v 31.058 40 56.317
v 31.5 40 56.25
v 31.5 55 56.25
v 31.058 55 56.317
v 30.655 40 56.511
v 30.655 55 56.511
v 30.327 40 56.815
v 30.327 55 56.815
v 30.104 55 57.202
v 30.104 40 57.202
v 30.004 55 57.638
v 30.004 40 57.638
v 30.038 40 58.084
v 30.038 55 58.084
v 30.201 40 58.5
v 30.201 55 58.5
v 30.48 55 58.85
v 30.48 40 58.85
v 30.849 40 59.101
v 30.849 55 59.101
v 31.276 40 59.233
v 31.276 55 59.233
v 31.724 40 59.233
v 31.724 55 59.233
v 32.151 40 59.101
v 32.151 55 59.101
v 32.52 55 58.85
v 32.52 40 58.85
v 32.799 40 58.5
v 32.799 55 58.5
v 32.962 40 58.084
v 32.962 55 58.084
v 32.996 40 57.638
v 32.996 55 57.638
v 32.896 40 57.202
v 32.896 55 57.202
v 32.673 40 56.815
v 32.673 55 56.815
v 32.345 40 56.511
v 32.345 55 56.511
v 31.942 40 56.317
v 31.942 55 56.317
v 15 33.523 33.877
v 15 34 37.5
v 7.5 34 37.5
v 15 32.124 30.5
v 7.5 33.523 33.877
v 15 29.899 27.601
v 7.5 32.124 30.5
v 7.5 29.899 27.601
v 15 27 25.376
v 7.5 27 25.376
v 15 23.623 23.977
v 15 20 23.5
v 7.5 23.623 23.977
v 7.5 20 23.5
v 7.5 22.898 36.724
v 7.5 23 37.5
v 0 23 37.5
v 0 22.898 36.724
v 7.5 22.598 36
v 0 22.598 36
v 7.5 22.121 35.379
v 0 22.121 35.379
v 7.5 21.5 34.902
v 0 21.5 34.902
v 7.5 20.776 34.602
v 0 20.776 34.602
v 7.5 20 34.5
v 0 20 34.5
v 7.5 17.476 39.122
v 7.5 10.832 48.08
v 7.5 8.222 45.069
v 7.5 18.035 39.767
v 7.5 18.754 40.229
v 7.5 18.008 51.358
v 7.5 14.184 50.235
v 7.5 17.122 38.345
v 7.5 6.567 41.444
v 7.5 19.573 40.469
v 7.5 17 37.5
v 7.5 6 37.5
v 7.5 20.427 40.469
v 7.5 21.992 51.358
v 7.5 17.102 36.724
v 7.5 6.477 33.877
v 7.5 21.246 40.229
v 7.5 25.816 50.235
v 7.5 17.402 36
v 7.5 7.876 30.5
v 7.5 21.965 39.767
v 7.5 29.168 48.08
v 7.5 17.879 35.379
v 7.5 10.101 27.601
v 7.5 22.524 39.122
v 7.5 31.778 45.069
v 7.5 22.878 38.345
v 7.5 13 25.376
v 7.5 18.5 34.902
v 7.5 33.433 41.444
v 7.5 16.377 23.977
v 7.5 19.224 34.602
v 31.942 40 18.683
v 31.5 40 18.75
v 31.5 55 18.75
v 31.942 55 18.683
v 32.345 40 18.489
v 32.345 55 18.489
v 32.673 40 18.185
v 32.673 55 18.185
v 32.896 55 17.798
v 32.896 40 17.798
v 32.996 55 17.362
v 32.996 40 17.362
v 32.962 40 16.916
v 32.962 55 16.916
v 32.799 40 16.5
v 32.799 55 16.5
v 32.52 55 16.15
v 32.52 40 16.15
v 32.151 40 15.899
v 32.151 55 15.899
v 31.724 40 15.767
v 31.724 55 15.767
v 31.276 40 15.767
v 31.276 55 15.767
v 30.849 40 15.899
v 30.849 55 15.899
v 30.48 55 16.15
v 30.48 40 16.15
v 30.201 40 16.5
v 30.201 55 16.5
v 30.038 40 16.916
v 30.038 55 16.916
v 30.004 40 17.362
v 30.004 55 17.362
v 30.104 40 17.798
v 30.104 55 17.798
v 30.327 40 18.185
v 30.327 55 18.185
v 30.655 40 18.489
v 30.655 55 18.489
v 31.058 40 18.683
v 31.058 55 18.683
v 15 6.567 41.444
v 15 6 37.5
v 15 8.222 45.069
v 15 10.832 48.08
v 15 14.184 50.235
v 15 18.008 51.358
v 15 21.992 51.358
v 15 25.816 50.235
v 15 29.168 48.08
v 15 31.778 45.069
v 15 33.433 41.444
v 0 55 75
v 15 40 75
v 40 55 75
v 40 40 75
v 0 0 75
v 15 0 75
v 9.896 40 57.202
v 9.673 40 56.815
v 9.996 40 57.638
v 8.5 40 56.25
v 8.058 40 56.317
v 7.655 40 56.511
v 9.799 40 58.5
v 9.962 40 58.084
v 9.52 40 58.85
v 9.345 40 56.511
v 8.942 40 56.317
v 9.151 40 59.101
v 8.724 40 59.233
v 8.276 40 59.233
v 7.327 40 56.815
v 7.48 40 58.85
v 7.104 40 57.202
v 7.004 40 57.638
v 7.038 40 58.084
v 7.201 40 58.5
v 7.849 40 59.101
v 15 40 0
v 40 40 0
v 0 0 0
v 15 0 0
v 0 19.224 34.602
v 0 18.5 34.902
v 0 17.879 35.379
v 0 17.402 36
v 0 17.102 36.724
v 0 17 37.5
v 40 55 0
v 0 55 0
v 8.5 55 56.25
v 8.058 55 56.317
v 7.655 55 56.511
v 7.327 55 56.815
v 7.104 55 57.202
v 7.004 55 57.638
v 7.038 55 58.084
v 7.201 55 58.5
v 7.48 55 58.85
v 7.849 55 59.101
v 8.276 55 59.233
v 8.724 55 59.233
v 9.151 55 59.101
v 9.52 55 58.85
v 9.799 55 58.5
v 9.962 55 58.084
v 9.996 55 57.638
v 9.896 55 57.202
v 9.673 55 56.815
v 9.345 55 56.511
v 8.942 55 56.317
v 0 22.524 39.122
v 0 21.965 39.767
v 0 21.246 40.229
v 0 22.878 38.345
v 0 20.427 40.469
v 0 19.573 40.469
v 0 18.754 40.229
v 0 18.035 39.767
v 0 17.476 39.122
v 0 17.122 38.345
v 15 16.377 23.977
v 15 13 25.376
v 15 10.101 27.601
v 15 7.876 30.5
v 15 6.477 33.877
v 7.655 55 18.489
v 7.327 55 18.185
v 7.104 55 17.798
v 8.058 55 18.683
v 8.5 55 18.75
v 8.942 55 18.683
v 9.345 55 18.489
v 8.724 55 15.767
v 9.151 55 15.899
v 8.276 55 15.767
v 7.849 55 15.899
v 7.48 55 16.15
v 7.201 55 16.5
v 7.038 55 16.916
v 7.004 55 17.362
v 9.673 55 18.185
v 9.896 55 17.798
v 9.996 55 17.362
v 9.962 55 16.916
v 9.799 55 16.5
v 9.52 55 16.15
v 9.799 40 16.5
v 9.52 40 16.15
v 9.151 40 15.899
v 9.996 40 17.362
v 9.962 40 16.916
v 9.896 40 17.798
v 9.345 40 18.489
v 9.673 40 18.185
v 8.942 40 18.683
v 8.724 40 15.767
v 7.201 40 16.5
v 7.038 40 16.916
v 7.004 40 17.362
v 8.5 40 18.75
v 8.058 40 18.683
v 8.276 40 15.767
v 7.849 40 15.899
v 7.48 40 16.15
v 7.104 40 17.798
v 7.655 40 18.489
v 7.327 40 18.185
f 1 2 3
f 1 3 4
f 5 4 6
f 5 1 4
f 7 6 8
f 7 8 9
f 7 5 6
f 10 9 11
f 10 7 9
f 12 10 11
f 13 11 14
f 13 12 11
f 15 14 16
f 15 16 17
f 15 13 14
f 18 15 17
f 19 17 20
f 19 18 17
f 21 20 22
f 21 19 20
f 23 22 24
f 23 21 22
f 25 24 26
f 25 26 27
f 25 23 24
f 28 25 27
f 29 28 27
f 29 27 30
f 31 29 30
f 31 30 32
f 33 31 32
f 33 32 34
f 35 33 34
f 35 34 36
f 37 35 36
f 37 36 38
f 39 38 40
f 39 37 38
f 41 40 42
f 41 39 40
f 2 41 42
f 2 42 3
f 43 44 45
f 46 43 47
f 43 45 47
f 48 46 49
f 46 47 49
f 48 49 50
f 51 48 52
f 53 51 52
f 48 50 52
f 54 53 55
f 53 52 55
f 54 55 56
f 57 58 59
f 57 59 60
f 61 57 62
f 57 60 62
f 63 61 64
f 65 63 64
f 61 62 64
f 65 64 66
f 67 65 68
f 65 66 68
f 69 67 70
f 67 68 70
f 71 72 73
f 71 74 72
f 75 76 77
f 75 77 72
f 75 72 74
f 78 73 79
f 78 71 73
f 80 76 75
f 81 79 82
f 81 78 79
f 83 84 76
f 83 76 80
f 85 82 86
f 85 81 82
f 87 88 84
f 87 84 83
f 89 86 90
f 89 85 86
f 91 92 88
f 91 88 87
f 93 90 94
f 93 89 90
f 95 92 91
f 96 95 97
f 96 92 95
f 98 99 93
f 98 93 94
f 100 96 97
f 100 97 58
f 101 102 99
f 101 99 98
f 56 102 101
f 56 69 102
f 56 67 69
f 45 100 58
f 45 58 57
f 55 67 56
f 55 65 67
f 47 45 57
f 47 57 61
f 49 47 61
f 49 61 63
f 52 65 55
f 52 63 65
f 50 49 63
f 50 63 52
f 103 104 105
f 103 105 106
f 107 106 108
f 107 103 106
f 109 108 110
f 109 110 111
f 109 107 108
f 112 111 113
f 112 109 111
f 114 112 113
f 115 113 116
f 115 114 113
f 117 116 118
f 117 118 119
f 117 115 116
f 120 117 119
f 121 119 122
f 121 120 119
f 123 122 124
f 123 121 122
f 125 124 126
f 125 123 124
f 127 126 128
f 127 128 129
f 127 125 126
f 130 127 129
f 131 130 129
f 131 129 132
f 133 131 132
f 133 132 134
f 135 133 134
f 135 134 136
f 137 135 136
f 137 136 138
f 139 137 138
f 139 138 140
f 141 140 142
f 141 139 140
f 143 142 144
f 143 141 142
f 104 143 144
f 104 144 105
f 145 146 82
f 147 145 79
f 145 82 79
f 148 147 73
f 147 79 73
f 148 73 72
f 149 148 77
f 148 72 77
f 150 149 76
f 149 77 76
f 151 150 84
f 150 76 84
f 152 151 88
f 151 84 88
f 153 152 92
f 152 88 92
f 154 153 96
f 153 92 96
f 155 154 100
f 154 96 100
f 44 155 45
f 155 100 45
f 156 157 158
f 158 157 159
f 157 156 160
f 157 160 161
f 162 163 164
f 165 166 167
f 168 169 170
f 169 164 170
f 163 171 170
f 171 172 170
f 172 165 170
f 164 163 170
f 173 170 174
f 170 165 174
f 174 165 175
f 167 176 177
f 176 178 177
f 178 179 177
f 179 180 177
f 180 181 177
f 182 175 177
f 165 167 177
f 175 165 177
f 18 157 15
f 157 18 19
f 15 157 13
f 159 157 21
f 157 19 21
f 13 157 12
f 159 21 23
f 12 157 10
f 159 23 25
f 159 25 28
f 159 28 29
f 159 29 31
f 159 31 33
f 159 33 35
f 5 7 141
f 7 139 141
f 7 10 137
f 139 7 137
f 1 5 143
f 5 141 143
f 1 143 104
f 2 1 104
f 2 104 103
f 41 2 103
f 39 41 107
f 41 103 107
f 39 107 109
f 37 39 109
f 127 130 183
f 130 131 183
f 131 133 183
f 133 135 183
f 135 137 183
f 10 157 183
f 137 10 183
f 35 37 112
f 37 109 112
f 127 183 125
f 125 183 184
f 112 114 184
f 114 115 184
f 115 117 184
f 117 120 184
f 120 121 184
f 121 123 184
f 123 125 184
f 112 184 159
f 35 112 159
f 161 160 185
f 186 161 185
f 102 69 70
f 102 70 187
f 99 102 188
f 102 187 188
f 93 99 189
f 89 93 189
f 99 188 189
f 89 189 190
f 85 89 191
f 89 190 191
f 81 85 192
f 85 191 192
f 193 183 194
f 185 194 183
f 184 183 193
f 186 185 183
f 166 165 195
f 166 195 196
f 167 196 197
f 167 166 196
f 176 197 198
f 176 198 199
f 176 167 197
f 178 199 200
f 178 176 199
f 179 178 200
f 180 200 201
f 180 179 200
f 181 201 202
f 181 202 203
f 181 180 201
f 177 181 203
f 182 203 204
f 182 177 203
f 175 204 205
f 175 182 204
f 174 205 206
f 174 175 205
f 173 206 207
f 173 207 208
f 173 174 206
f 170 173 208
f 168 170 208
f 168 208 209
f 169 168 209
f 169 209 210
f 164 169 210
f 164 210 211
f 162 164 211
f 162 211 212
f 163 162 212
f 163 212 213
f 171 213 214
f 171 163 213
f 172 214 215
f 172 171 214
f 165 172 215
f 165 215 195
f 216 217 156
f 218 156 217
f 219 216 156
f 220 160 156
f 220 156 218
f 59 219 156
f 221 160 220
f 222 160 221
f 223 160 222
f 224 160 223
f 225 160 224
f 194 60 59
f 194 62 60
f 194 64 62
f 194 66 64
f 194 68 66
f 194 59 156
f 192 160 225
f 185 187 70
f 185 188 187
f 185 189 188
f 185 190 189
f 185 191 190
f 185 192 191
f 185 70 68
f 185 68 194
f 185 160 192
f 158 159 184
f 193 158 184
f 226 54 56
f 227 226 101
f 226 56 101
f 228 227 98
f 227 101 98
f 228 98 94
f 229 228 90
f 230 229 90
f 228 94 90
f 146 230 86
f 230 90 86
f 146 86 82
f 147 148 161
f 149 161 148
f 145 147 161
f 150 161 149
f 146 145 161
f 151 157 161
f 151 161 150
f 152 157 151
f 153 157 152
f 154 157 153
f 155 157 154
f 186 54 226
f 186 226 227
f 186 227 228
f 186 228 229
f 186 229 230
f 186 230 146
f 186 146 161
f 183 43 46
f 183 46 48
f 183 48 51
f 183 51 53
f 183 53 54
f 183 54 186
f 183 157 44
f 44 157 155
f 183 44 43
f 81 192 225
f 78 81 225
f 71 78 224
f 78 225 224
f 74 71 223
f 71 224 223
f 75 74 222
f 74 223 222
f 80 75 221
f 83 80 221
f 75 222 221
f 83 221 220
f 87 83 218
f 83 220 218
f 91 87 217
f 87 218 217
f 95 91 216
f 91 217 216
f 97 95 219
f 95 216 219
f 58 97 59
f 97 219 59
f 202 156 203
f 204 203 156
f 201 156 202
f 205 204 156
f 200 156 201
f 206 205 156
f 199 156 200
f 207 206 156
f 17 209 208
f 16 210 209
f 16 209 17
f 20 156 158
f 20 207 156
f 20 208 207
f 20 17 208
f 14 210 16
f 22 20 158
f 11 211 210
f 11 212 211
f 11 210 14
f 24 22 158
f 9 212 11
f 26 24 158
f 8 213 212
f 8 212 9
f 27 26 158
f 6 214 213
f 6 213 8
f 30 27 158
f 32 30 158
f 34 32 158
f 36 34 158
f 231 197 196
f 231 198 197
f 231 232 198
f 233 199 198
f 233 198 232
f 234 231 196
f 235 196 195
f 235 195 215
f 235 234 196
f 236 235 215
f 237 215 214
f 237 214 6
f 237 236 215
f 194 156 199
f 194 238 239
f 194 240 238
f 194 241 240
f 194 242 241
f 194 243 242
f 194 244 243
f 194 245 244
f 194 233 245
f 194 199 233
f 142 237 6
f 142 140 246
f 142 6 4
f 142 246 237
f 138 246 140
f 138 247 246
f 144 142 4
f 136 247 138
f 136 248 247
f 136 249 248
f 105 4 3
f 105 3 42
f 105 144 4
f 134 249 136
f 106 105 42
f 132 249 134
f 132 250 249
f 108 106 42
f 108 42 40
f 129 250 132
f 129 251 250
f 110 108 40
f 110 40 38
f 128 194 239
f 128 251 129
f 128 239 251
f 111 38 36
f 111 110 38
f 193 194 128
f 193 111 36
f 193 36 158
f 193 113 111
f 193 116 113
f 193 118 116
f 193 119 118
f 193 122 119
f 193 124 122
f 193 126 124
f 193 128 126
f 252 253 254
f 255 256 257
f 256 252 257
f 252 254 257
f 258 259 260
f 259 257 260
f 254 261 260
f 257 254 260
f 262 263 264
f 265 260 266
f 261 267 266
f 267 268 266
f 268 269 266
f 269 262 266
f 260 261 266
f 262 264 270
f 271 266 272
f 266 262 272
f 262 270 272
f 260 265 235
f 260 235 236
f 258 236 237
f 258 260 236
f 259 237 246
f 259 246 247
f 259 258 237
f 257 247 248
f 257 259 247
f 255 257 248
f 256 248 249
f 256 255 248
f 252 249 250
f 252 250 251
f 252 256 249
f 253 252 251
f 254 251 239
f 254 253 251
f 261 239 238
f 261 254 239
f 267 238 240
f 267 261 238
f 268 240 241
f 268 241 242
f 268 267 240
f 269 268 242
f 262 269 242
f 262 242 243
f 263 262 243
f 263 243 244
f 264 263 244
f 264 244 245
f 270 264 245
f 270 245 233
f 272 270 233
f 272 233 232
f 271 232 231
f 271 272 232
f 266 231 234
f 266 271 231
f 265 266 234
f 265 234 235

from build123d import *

# Parameters (mm, degrees)
SKETCH1_W           = 75
SKETCH1_H           = 40
SKETCH1_R           = 14
BOSS_EXTRUDE1_DEPTH = 15
SKETCH1_3_R         = 14
SKETCH1_3_R_2       = 3
BOSS_EXTRUDE2_DEPTH = 7.5
SKETCH3_W           = 40
SKETCH3_H           = 75
SKETCH3_R           = 1.5
BOSS_EXTRUDE3_DEPTH = 15


with BuildPart() as part:
    # Sketch1 → Boss-Extrude1 (new body)
    with BuildSketch(Plane(origin=(0, 0, 0), x_dir=(0, 0, -1), z_dir=(1, 0, 0))):
        with Locations((-37.5, 20)):
            Rectangle(SKETCH1_W, SKETCH1_H)
        with Locations((-37.5, 20)):
            Circle(SKETCH1_R, mode=Mode.SUBTRACT)
    extrude(amount=BOSS_EXTRUDE1_DEPTH)

    # Sketch1<3> → Boss-Extrude2 (add)
    with BuildSketch(Plane(origin=(0, 0, 0), x_dir=(0, 0, -1), z_dir=(1, 0, 0))):
        with Locations((-37.5, 20)):
            Circle(SKETCH1_3_R)
        with Locations((-37.5, 20)):
            Circle(SKETCH1_3_R_2, mode=Mode.SUBTRACT)
    extrude(amount=BOSS_EXTRUDE2_DEPTH)

    # Sketch3 → Boss-Extrude3 (add)
    with BuildSketch(Plane(origin=(0, 40, 0), x_dir=(1, 0, 0), z_dir=(0, 1, 0))):
        with Locations((20, -37.5)):
            Rectangle(SKETCH3_W, SKETCH3_H)
        with Locations((8.5, -17.25)):
            Circle(SKETCH3_R, mode=Mode.SUBTRACT)
        with Locations((31.5, -17.25)):
            Circle(SKETCH3_R, mode=Mode.SUBTRACT)
        with Locations((31.5, -57.75)):
            Circle(SKETCH3_R, mode=Mode.SUBTRACT)
        with Locations((8.5, -57.75)):
            Circle(SKETCH3_R, mode=Mode.SUBTRACT)
    extrude(amount=BOSS_EXTRUDE3_DEPTH)


solid = part.part
